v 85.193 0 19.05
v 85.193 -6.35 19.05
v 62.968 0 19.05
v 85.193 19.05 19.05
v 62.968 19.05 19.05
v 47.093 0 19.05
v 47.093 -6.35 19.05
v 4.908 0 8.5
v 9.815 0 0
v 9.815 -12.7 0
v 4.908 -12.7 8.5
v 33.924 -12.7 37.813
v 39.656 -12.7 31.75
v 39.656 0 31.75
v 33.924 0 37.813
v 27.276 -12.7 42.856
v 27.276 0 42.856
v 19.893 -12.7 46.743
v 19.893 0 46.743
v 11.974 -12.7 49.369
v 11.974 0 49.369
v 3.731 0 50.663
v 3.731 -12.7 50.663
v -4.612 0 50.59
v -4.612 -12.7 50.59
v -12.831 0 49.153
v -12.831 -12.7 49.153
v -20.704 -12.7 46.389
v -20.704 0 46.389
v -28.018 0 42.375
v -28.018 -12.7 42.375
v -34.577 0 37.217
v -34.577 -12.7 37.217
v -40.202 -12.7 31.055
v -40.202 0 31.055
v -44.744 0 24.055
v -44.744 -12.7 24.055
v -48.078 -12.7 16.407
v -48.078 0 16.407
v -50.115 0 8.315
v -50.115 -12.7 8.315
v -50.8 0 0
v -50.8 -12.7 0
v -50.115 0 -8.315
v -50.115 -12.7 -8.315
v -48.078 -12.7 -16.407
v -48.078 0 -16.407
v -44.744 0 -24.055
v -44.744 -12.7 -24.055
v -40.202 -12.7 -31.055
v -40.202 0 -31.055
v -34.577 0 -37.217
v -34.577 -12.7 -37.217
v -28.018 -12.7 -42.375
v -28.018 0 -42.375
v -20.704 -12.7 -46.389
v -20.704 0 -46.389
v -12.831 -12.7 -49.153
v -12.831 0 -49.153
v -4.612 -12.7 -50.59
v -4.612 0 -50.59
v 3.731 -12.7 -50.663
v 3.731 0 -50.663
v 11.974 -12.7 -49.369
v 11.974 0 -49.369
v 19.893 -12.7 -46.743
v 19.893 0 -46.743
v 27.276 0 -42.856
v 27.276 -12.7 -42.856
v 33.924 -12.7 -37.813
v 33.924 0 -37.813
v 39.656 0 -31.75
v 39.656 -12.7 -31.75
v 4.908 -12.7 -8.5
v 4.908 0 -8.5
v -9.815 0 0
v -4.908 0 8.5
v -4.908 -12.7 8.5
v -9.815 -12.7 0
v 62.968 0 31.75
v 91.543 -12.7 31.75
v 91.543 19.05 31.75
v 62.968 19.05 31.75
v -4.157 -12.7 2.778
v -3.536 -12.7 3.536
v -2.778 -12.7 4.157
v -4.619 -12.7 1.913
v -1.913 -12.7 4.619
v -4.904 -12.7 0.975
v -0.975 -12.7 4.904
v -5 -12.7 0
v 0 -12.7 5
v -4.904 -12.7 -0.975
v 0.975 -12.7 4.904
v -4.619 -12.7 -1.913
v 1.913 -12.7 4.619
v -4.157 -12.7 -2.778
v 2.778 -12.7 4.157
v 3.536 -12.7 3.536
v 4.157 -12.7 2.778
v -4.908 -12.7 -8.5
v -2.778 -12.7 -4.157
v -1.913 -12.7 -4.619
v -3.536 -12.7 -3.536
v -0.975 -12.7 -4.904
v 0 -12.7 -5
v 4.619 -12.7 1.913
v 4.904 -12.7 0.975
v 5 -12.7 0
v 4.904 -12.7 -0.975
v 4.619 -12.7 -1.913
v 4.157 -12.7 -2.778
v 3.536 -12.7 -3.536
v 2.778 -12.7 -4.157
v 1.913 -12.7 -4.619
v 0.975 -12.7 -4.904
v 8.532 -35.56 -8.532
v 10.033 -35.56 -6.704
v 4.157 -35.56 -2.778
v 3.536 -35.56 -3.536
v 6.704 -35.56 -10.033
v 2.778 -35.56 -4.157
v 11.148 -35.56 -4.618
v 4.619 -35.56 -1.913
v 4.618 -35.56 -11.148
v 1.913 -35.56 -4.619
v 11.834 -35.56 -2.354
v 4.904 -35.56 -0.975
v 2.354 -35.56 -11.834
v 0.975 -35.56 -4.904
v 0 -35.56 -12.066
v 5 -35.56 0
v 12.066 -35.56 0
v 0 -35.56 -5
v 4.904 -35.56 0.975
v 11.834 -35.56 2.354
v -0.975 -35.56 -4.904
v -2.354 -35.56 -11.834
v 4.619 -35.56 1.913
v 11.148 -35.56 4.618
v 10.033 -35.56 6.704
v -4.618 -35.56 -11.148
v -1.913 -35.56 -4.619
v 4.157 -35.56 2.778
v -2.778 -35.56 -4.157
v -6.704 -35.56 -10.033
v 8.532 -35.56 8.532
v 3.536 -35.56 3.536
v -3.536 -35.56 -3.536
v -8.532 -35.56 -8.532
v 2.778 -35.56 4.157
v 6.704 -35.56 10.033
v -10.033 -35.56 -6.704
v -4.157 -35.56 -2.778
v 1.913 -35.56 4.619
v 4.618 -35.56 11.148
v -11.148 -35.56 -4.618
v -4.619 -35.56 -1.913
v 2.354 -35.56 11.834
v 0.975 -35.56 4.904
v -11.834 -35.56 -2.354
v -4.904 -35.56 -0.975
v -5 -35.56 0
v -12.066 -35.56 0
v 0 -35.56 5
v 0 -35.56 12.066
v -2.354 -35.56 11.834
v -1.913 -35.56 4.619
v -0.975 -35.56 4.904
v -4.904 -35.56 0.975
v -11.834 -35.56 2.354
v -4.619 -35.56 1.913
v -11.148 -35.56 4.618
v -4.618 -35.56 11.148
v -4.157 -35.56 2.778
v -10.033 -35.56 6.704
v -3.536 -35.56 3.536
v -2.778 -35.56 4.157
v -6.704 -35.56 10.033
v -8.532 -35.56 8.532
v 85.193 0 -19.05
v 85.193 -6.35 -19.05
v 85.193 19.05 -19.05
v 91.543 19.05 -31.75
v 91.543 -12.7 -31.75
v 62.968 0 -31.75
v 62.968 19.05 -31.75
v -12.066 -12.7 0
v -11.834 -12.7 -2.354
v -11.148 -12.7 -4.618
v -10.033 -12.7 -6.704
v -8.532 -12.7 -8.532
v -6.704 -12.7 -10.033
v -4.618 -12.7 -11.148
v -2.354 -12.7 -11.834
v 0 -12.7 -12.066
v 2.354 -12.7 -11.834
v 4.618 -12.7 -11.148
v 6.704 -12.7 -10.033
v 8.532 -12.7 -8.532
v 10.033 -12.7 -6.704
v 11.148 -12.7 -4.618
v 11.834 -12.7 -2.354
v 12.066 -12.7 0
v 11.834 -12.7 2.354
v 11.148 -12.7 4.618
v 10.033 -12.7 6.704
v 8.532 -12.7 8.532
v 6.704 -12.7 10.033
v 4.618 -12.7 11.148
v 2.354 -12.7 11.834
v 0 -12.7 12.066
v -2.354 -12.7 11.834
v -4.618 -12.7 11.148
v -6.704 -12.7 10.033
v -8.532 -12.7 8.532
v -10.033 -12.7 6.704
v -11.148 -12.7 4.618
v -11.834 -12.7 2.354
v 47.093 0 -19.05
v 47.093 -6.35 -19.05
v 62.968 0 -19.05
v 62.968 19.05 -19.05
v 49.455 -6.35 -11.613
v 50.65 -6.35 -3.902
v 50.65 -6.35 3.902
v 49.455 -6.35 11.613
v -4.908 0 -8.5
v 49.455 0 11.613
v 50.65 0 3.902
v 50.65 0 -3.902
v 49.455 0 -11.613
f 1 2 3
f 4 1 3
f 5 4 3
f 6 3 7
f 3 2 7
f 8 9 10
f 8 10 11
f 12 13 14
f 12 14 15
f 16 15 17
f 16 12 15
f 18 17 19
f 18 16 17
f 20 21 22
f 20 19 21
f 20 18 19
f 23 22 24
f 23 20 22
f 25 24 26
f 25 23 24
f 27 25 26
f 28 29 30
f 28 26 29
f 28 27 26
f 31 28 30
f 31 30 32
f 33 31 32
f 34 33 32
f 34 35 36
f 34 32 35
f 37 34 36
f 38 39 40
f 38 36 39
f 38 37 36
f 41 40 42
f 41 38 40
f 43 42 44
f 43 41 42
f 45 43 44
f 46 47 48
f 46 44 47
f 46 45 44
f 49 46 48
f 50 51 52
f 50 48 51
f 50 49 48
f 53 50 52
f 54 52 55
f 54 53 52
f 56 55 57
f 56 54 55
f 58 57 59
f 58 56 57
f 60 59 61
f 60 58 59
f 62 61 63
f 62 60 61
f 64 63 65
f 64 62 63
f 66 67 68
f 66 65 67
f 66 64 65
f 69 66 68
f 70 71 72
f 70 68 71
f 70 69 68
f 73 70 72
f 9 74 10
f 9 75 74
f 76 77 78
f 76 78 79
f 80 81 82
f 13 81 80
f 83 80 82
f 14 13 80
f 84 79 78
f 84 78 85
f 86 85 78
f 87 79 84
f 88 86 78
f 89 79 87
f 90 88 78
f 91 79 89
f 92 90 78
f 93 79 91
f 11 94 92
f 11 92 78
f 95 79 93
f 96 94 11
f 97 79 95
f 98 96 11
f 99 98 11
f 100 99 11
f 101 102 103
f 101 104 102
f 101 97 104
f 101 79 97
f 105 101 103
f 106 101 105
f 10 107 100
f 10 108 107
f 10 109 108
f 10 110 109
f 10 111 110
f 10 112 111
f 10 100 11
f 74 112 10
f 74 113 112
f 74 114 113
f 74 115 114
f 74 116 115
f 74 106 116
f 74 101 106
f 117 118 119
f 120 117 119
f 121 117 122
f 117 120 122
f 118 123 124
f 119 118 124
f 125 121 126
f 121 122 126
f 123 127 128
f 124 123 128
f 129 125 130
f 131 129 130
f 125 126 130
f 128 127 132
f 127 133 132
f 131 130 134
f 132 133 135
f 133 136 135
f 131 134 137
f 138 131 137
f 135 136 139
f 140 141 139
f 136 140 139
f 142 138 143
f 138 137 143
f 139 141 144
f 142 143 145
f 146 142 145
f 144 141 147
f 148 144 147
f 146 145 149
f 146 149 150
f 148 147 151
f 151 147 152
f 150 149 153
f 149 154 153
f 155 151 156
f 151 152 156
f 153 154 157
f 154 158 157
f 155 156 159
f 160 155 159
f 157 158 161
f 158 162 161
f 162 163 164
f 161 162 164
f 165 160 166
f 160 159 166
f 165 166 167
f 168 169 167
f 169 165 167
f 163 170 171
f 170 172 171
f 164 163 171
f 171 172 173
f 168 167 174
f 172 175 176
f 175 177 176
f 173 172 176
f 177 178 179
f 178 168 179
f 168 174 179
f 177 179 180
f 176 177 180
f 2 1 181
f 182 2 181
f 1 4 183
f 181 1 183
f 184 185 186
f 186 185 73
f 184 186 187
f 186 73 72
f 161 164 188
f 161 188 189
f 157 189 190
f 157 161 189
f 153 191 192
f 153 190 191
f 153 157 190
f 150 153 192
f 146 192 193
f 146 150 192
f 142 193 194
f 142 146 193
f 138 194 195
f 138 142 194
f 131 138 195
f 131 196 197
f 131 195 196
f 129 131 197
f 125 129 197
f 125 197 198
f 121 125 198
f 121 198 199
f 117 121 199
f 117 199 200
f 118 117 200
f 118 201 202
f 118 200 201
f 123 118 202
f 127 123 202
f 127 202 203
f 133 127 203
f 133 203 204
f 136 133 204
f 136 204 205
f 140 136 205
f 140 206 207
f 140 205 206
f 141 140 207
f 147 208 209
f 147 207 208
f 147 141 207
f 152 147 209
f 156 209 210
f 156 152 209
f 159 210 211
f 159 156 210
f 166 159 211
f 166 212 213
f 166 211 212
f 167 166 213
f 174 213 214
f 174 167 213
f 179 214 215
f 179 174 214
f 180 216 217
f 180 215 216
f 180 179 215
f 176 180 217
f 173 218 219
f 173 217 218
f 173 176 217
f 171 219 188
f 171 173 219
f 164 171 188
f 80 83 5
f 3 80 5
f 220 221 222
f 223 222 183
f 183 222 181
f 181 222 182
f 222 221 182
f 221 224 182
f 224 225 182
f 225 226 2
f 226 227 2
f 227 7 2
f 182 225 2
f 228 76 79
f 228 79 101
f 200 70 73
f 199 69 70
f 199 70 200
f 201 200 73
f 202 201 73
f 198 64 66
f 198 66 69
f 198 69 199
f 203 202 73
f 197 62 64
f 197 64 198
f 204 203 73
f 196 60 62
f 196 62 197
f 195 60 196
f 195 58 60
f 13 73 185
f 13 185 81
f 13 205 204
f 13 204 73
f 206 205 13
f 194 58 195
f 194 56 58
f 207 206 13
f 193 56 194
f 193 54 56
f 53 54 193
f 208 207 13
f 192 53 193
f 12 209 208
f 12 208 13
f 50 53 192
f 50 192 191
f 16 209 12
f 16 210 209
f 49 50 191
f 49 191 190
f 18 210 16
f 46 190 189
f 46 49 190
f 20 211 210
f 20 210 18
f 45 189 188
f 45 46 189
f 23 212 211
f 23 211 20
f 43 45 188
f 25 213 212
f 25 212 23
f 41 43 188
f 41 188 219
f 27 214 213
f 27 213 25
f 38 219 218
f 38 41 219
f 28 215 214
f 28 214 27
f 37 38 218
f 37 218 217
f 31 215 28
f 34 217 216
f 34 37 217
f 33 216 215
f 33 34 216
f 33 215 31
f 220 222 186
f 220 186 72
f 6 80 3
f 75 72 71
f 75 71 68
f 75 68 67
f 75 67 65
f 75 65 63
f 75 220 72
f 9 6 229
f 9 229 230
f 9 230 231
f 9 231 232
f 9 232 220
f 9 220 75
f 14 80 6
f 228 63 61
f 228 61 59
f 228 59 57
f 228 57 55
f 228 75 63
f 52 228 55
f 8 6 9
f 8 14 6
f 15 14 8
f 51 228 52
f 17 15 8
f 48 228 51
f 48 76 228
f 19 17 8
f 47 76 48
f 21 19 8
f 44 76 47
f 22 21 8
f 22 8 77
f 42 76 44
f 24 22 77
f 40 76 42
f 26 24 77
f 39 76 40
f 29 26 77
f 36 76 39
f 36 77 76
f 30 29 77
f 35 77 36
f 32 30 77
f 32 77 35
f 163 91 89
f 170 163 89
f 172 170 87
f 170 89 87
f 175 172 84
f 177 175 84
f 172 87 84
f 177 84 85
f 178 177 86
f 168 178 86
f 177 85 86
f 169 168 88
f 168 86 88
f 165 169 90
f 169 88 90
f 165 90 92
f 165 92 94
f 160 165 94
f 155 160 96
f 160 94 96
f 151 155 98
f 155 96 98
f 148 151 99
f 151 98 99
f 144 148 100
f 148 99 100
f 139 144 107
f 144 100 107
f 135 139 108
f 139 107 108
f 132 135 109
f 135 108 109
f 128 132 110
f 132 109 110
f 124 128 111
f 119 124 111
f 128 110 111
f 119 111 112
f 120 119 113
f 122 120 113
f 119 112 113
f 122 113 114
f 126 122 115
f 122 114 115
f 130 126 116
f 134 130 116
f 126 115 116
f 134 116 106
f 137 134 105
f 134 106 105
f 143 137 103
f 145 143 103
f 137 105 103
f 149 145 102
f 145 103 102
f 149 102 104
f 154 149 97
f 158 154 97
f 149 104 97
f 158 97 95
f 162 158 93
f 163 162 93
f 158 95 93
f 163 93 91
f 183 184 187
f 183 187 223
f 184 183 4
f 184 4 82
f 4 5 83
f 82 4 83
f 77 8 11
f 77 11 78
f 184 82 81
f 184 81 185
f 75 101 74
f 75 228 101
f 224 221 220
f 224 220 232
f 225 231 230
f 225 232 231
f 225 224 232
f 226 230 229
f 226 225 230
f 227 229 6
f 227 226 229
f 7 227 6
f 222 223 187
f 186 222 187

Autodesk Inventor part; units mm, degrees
ref_plane "YZ Plane" through (0, 0, 0) normal (1, 0, 0) x (0, 1, 0)
ref_plane "XZ Plane" through (0, 0, 0) normal (0, 1, 0) x (-1, 0, 0)
ref_plane "XY Plane" through (0, 0, 0) normal (0, 0, 1) x (1, 0, 0)
sketch "Sketch1" plane through (0, 0, 0) normal (0, 0, 1) x (1, 0, 0)
  line L0 (0, 0) -> (-50.8, 0)
  line L1 (-50.8, 0) -> (-50.8, -12.7)
  line L2 (-50.8, -12.7) -> (-38.1, -12.7)
  line L3 (-12.0663, -25.4) -> (-12.0663, -35.56)
  line L4 (-5, -35.56) -> (-5, -4.064)
  line L5 (-5, -4.064) -> (0, -4.064)
  line L6 (0, -4.064) -> (0, 0)
  line L7 (-12.0663, -35.56) -> (-5, -35.56)
  line L8 (-38.1, -12.7) -> (-12.0663, -12.7)
  line L9 (-12.0663, -12.7) -> (-12.0663, -25.4)
  dimension "d0" = 50.8
  dimension "d1" = 5
  dimension "d2" = 12.0663
  dimension "d13" = 22.86
  dimension "d15" = 31.496
revolve "Revolution1" add sketch "Sketch1" angle 360 about axis through (0, -4.064, 0) along (0, 1, 0)
sketch "Sketch5" plane through (0, 0, 0) normal (0, 1, 0) x (1, 0, 0)
  circle A0 centre (0, 0) radius 5 projected
  line L0 (9.815, 0) -> (4.9075, -8.5)
  line L1 (4.9075, -8.5) -> (-4.9075, -8.5)
  line L2 (-4.9075, -8.5) -> (-9.815, 0)
  line L3 (-9.815, 0) -> (-4.9075, 8.5)
  line L4 (-4.9075, 8.5) -> (4.9075, 8.5)
  line L5 (4.9075, 8.5) -> (9.815, 0)
  point P0 (0, 0)
  point P1 (0, 0)
  dimension "d16" = 17
extrude "Extrusion1" cut sketch "Sketch5" against normal blind 12.7 contours A0 | L0 L1 L2 L3 L4 L5
sketch "Sketch7" plane through (0, -12.7, 0) normal (0, -1, 0) x (1, 0, 0)
  circle A0 centre (0, 0) radius 50.8 projected
  line L0 (47.0929, -19.05) -> (85.1929, -19.05)
  line L1 (85.1929, -19.05) -> (85.1929, -31.75)
  line L2 (85.1929, -31.75) -> (39.6557, -31.75)
  circle A1 centre (0, 0) radius 5 construction
  line L3 (0, 0) -> (5, 0) construction
  line L4 (50.8, 0) -> (83.823, 0) construction
  dimension "d23" = 38.1
  dimension "d24" = 12.7
  dimension "d25" = 19.05
extrude "Extrusion3" add sketch "Sketch7" against normal blind 12.7 contours A0 L0 L1 L2
sketch "Sketch8" plane through (39.6557, 0, -31.75) normal (0, 1, 0) x (1, 0, 0)
  line L0 (45.5371, -12.7) -> (45.5371, 0) projected
  line L1 (45.5371, 0) -> (0, 0) projected
  line L2 (7.4371, -12.7) -> (45.5371, -12.7) projected
  line L3 (35.8511, -107.95) -> (35.8511, 44.45)
  line L4 (26.3261, -107.95) -> (26.3261, 44.45)
  line L5 (45.5371, -12.7) -> (23.3121, -12.7)
  line L6 (23.3121, -12.7) -> (23.3121, 0)
  line L7 (23.3121, 0) -> (45.5371, 0)
  line L8 (45.5371, 0) -> (45.5371, -12.7)
  point P0 (-39.6557, -31.75)
  point P1 (23.3121, 0)
  point P2 (23.3121, -12.7)
  dimension "d28" = 22.225
extrude "Extrusion4" add sketch "Sketch8" along normal blind 19.05
sketch "Sketch9" plane through (85.1929, -12.7, -31.75) normal (0, 0, -1) x (-1, 0, 0)
  line L0 (22.225, 12.7) -> (22.225, 31.75) projected
  line L1 (0, 31.75) -> (22.225, 31.75) projected
  arc A0 (38.6742, 14.3599) -> (35.4992, 14.3599) centre (37.0867, 18.85) ccw projected
  line L2 (0, 0) -> (0, 31.75) projected
  circle A1 centre (37.0867, 18.85) radius 4.953
  point P0 (85.1929, 12.7)
  dimension "d31" = 9.906
extrude "Extrusion5" cut sketch "Sketch9" against normal through all
mirror "Mirror1" about plane through (0, 0, 0) normal (0, 0, 1) of "Extrusion4", "Extrusion5", "Extrusion3"
sketch "Sketch10" plane through (39.6557, -12.7, -31.75) normal (0, -1, 0) x (1, 0, 0)
  arc A0 (7.4371, 12.7) -> (7.4371, 50.8) centre (-39.6557, 31.75) ccw projected
  line L0 (45.5371, 50.8) -> (7.4371, 50.8) projected
  line L1 (45.5371, 12.7) -> (7.4371, 12.7) projected
  arc A1 (7.4371, 12.7) -> (7.4371, 50.8) centre (-39.6557, 31.75) ccw
  line L2 (7.4371, 50.8) -> (45.5371, 50.8)
  line L3 (45.5371, 0) -> (45.5371, 12.7) projected
  line L4 (45.5371, 50.8) -> (45.5371, 12.7)
  line L5 (45.5371, 12.7) -> (7.4371, 12.7)
extrude "Extrusion6" add sketch "Sketch10" against normal blind 6.35
sketch "Sketch11" plane through (85.1929, -12.7, -31.75) normal (1, 0, 0) x (0, 0, -1)
  line L0 (-63.5, 0) -> (-63.5, 31.75) projected
  line L1 (-50.8, 31.75) -> (-63.5, 31.75) projected
  line L2 (-12.7, 31.75) -> (0, 31.75) projected
  line L3 (0, 0) -> (0, 31.75) projected
  line L4 (0, 0) -> (-63.5, 0) projected
  line L5 (-63.5, 31.75) -> (0, 31.75)
  line L6 (0, 31.75) -> (0, 0)
  line L7 (0, 0) -> (-63.5, 0)
  line L8 (-63.5, 0) -> (-63.5, 31.75)
  point P0 (-31.75, 12.7)
  point P1 (-12.7, 31.75)
  point P2 (-50.8, 31.75)
extrude "Extrusion7" add sketch "Sketch11" along normal blind 6.35
sketch "Sketch12" plane through (39.6557, 19.05, -31.75) normal (0, 1, 0) x (1, 0, 0)
  point P0 (-39.6557, -31.75)
equation "\"d0\" = topPartRadius"
equation "\"d2\" = stemRadius"
equation "\"d13\" = stemHeight"
equation "\"d15\" = internalHoleDepth"
equation "\"topPartRadius\" = 0.5 * topPartDiameter"
equation "\"totalHeight\" = 35.56"
equation "\"stemRadius\" = 12.06627"
equation "\"stemHeight\" = 22.86"
equation "\"internalHoleDepth\" = 31.496"
equation "\"topPartDiameter\" = 101.6"
properties part number "celestronTripodAdapter" material "PC/ABS Plastic"
